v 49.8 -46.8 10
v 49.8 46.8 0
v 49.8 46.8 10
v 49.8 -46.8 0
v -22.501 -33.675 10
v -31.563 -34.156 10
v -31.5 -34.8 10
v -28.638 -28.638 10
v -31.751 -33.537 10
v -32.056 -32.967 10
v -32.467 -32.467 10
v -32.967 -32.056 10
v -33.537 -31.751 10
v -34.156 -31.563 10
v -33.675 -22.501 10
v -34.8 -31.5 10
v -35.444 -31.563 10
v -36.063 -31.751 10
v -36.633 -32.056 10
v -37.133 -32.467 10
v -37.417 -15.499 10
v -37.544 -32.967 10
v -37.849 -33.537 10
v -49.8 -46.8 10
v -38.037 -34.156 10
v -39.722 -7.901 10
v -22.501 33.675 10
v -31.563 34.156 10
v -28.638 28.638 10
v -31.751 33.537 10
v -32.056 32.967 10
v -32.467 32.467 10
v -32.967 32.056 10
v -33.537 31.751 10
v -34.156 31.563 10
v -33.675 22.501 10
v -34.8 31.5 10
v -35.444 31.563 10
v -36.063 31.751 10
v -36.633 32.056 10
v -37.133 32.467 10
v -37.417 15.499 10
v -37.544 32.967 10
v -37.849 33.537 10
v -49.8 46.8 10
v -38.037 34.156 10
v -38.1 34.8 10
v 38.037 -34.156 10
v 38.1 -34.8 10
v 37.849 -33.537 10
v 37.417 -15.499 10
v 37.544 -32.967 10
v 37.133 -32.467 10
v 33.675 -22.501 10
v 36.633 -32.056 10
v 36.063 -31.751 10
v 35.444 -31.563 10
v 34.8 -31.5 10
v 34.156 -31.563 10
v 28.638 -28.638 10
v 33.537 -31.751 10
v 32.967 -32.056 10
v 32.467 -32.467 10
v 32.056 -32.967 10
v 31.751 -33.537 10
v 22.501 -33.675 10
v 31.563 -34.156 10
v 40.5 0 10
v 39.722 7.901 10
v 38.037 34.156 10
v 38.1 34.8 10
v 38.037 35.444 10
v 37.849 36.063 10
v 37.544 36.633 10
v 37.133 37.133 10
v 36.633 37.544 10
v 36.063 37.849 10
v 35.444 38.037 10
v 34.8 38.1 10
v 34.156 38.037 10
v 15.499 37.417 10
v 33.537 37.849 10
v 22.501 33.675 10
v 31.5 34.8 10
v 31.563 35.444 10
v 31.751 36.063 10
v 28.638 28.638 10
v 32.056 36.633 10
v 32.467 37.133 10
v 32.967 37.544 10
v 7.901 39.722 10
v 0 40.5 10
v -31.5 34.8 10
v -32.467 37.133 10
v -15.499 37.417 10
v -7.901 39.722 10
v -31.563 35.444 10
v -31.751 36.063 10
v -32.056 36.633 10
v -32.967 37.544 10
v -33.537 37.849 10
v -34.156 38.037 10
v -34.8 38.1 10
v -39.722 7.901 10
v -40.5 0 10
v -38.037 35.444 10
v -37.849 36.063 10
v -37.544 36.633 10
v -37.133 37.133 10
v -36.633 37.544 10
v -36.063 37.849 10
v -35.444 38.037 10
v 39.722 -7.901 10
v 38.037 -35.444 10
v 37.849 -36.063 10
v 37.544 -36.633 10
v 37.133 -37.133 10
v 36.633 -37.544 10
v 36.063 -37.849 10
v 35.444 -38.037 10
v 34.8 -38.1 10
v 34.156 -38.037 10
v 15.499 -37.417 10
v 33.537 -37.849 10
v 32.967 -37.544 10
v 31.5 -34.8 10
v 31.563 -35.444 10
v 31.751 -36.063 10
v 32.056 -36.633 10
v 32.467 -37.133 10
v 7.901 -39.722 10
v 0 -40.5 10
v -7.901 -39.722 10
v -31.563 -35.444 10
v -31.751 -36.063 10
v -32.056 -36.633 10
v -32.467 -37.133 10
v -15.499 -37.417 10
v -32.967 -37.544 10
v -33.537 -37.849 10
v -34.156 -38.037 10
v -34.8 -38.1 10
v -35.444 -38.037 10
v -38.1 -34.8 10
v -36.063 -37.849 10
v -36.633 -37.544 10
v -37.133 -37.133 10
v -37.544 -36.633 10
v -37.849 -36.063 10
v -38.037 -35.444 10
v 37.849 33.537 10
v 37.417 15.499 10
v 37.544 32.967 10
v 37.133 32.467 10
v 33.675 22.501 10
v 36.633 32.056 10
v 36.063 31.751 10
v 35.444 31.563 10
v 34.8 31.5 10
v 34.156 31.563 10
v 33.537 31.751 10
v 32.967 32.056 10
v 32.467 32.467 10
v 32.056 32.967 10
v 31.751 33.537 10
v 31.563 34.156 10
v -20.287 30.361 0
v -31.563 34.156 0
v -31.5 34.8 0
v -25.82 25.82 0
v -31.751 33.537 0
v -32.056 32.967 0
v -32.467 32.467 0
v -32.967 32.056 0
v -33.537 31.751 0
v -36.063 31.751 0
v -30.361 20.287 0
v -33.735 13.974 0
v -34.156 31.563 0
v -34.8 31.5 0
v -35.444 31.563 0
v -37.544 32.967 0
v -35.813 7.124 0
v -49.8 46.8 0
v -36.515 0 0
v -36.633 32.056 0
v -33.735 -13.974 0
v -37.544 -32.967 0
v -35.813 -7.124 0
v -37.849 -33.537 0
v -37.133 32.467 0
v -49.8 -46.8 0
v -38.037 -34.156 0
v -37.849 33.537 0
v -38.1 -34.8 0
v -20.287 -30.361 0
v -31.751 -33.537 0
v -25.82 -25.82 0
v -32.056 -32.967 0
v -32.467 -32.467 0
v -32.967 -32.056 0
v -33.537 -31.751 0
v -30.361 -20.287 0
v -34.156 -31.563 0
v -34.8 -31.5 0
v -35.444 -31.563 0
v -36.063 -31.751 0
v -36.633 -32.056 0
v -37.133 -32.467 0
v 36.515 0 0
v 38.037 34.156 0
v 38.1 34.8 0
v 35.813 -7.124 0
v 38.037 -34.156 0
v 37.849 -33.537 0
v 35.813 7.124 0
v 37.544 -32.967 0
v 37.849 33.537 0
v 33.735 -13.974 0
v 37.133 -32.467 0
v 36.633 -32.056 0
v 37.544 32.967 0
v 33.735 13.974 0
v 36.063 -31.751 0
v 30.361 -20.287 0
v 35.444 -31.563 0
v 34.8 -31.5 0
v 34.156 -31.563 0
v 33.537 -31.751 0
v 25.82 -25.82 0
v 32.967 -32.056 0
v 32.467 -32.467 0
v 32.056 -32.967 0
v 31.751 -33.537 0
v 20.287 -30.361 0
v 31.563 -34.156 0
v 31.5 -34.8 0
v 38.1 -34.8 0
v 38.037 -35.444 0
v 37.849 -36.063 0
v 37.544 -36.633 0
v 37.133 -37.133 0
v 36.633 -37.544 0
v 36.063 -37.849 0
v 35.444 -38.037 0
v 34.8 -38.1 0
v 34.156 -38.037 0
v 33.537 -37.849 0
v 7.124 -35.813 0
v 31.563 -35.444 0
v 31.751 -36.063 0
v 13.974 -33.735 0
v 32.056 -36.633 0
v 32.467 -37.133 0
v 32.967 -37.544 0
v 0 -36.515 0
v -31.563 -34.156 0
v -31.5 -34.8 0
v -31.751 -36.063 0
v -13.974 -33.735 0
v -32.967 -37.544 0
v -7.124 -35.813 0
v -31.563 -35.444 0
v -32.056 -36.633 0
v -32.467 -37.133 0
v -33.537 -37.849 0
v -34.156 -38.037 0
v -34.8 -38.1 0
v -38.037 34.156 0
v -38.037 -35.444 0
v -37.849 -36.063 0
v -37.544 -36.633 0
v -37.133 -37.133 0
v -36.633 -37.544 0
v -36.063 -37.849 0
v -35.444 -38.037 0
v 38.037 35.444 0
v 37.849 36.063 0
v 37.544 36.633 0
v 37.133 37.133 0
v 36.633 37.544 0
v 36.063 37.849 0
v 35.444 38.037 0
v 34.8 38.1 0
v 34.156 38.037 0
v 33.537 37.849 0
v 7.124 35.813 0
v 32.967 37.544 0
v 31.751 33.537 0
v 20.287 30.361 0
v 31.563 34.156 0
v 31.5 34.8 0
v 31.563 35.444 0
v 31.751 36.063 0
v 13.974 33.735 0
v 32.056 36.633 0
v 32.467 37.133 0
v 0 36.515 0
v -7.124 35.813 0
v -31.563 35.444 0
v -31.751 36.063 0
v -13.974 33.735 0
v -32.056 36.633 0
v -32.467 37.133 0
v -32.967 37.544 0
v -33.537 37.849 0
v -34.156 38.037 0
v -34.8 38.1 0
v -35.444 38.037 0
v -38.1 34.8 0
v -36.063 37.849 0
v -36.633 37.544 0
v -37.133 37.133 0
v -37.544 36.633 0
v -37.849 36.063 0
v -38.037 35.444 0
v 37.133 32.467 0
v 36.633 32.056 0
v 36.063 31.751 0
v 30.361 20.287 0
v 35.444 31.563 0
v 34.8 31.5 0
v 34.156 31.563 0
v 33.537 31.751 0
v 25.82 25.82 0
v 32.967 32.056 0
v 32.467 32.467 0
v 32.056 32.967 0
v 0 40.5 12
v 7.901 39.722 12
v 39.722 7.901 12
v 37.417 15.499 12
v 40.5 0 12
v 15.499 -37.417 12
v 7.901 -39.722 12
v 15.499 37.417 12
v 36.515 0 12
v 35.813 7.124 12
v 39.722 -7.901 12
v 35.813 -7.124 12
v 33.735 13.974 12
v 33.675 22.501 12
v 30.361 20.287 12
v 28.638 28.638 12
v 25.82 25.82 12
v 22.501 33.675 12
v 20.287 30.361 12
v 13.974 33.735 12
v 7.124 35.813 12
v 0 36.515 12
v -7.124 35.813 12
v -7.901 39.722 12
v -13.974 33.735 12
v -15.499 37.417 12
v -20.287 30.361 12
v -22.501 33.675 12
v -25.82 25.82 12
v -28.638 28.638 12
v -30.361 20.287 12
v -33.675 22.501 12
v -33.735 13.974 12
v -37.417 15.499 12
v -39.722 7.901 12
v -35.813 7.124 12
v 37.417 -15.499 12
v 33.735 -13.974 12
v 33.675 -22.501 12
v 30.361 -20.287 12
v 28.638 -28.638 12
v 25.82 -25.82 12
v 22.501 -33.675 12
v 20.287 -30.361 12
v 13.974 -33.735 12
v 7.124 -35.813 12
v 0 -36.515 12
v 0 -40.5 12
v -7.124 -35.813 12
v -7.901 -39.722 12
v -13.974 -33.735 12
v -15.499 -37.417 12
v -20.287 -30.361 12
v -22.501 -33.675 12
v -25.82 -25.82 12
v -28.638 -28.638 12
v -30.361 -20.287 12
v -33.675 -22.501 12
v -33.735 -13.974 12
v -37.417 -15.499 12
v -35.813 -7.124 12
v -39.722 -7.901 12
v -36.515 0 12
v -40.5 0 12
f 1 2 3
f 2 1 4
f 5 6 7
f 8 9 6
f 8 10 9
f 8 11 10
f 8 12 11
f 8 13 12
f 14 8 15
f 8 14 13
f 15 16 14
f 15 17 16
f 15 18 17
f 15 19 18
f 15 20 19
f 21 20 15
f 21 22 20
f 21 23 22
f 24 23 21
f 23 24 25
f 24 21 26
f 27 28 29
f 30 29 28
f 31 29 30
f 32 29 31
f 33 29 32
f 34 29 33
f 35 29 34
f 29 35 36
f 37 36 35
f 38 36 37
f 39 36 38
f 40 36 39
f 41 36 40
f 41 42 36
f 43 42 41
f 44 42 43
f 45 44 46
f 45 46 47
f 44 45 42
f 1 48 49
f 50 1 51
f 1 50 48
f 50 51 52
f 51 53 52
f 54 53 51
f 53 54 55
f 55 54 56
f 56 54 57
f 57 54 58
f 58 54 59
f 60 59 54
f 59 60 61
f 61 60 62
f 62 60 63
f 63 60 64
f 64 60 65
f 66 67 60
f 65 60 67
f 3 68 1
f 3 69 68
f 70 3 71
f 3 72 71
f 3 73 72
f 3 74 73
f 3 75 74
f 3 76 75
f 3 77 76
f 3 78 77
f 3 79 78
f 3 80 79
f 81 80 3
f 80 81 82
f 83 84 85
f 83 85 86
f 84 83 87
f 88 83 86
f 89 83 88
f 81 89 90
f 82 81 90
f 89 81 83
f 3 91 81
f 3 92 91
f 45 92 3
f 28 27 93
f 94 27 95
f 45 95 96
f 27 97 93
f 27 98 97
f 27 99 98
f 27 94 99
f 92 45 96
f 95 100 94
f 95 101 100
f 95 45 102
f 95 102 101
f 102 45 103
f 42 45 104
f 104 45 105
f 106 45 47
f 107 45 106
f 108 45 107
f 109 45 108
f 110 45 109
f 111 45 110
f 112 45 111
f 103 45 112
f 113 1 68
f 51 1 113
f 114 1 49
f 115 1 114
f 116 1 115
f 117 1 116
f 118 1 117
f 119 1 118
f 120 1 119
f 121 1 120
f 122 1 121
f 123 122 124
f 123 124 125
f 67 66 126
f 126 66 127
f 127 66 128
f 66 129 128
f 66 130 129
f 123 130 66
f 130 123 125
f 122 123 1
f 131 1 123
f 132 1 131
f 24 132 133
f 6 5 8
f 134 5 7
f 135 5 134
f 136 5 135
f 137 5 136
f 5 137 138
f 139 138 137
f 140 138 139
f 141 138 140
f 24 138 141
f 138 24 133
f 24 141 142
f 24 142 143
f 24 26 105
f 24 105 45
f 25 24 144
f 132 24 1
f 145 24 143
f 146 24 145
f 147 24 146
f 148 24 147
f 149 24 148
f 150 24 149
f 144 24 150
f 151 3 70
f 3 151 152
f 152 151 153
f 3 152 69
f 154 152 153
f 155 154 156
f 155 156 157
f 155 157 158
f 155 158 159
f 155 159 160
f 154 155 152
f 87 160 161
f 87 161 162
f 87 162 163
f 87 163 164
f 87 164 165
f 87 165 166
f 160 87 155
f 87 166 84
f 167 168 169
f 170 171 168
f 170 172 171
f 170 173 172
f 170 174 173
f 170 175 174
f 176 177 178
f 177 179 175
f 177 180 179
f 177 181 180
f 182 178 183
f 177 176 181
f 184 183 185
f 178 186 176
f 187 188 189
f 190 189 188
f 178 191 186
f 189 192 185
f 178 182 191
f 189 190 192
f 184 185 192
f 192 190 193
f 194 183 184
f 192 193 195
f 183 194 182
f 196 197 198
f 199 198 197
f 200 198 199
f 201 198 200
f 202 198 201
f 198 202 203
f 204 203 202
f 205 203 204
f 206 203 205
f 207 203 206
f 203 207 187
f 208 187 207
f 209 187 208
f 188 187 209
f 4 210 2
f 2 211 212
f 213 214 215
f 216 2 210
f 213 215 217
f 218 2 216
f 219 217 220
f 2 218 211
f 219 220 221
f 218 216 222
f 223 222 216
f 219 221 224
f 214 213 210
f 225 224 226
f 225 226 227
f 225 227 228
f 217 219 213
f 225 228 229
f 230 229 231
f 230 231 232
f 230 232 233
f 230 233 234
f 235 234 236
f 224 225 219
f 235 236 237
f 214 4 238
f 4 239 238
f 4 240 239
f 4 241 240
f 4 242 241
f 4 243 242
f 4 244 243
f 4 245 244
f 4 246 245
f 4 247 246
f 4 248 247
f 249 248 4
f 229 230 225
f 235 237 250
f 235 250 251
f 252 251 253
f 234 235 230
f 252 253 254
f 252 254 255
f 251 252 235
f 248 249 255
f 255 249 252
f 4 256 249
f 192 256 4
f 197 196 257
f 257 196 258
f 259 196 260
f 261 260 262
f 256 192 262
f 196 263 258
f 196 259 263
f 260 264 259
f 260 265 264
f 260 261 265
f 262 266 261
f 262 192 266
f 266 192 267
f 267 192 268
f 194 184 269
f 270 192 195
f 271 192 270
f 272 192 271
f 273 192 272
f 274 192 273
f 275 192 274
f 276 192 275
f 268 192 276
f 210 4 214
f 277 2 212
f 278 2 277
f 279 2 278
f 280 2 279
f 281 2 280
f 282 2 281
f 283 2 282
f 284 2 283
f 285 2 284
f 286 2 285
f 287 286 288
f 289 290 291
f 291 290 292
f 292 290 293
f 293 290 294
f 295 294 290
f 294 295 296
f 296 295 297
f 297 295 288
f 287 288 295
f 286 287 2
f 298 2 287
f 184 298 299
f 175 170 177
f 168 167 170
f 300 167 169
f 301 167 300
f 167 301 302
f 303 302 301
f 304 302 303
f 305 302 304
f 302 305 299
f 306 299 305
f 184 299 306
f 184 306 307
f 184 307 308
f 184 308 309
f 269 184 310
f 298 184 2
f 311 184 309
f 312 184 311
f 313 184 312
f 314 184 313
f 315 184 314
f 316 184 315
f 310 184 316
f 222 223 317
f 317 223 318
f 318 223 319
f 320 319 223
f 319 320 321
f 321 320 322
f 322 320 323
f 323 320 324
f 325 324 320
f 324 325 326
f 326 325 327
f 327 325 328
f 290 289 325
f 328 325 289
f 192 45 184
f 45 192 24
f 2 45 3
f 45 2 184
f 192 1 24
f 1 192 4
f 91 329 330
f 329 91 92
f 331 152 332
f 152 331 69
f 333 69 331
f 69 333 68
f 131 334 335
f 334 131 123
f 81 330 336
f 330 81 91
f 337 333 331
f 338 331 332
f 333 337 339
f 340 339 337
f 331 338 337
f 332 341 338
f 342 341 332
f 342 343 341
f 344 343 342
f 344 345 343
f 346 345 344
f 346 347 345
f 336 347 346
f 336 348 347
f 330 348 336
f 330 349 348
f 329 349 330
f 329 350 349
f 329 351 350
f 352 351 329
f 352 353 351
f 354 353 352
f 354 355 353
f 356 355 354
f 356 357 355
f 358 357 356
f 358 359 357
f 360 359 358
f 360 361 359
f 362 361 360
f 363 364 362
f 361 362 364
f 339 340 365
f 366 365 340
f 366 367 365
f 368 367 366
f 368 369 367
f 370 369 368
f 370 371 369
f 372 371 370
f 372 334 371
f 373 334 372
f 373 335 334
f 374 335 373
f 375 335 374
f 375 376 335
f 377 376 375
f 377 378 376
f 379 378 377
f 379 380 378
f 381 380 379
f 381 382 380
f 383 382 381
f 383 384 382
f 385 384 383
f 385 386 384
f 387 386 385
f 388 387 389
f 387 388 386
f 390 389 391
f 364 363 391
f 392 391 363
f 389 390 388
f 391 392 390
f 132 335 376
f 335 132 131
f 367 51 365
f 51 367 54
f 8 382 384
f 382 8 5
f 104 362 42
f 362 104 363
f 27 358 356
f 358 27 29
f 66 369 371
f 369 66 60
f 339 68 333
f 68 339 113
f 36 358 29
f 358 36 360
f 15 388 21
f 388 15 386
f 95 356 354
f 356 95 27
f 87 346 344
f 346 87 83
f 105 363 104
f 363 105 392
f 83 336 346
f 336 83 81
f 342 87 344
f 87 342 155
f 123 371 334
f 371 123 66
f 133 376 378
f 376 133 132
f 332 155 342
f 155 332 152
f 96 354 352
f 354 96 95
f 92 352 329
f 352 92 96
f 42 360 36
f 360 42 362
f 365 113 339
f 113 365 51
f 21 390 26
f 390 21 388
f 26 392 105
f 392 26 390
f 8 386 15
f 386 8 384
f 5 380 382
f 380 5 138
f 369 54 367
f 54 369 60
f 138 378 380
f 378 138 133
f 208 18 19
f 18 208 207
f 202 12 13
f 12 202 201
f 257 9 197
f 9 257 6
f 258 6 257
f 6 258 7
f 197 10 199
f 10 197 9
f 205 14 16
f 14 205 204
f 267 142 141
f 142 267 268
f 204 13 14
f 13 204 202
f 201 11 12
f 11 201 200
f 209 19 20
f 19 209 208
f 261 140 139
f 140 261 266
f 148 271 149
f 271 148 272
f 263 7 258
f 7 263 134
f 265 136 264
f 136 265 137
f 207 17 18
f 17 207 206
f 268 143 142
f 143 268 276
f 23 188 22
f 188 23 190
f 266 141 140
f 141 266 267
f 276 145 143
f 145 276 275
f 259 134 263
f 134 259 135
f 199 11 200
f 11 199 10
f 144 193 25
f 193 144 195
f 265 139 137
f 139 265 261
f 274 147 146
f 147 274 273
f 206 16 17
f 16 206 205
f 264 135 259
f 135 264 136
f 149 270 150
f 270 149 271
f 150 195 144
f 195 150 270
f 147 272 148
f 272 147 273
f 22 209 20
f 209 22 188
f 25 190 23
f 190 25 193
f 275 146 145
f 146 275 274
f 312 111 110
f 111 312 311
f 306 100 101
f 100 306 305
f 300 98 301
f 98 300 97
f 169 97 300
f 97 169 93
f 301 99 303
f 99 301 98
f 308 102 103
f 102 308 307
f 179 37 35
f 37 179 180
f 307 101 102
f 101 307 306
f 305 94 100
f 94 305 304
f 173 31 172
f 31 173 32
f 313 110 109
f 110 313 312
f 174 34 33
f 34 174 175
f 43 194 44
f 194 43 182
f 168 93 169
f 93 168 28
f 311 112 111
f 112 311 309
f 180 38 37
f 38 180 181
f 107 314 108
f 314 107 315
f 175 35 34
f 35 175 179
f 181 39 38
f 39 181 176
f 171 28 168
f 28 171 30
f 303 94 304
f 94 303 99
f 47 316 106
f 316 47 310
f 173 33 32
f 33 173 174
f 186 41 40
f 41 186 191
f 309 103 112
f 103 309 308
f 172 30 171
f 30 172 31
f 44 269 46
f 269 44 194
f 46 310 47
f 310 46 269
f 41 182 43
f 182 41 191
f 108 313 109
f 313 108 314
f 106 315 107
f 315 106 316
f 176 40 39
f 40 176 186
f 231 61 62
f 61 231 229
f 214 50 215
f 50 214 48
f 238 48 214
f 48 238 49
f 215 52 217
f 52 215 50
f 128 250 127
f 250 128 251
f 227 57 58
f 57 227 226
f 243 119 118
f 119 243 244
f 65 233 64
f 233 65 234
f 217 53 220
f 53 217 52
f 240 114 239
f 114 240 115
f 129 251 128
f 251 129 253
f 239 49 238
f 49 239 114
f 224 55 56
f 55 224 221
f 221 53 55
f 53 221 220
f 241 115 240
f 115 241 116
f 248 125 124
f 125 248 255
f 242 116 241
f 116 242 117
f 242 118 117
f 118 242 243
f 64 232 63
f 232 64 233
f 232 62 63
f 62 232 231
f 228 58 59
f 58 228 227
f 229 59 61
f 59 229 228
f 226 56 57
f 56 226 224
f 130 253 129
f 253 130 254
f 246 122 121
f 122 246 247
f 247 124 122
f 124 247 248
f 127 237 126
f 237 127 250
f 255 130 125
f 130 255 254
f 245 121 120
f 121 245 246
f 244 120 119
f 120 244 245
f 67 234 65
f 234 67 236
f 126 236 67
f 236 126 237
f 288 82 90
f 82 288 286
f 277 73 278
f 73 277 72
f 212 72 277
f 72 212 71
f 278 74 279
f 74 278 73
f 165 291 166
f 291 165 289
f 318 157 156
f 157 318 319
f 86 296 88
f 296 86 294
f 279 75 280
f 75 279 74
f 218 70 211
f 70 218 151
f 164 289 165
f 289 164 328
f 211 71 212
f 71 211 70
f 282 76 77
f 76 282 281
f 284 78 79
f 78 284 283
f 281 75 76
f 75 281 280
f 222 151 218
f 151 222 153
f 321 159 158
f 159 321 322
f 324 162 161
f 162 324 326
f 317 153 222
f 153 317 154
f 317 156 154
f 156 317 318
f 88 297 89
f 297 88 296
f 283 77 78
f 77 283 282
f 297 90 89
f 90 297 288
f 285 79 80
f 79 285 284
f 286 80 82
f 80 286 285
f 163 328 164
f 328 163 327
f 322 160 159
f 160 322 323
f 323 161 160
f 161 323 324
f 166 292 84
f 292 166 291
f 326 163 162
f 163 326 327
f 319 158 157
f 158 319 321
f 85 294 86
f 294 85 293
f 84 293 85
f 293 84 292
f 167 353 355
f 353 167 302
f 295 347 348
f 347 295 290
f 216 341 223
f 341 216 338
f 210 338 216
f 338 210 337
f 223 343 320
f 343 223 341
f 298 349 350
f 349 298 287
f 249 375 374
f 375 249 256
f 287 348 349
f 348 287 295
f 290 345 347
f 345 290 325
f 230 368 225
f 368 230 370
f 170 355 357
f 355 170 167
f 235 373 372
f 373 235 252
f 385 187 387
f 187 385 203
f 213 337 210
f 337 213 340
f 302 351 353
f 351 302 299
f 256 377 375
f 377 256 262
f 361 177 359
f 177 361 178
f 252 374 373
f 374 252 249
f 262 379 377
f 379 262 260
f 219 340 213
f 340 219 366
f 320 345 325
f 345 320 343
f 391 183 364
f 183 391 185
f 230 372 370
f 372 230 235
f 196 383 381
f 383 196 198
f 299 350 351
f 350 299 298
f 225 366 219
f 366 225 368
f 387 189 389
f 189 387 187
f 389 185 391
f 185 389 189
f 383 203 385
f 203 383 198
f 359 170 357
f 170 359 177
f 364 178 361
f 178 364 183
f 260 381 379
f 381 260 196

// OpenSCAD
$fn = 32;

// ----------------------------------------------------------------------
// Motor mount plate: NEMA34, 99.6 x 93.6 x 12 mm
// ----------------------------------------------------------------------

// --- parameters (mm) ---
mount_w = 99.6;           // plate length, X
mount_d = 93.6;           // plate width, Y
mat_t = 10;               // plate thickness
motor_pitch = 69.6;       // NEMA34 bolt spacing
motor_d = 6.6;            // NEMA34 screw clearance
center_bore = 73.03;      // pilot boss bore
boss_d = 81;              // raised pilot ring
boss_h = 2;               // raised pilot ring height

module plate() {
  translate([-mount_w / 2, -mount_d / 2, 0]) cube([mount_w, mount_d, mat_t]);
}

module motor_holes() {
  for (sx = [-1, 1]) for (sy = [-1, 1])
    translate([sx * motor_pitch / 2, sy * motor_pitch / 2, -1])
      cylinder(h = mat_t + 2, d = motor_d);
}
module pilot_ring() {
  translate([0, 0, mat_t - 1]) cylinder(h = boss_h + 1, d = boss_d);
}

difference() {
  union() {
    plate();
    pilot_ring();
  }
  motor_holes();
  translate([0, 0, -1]) cylinder(h = mat_t + boss_h + 2, d = center_bore);
}
